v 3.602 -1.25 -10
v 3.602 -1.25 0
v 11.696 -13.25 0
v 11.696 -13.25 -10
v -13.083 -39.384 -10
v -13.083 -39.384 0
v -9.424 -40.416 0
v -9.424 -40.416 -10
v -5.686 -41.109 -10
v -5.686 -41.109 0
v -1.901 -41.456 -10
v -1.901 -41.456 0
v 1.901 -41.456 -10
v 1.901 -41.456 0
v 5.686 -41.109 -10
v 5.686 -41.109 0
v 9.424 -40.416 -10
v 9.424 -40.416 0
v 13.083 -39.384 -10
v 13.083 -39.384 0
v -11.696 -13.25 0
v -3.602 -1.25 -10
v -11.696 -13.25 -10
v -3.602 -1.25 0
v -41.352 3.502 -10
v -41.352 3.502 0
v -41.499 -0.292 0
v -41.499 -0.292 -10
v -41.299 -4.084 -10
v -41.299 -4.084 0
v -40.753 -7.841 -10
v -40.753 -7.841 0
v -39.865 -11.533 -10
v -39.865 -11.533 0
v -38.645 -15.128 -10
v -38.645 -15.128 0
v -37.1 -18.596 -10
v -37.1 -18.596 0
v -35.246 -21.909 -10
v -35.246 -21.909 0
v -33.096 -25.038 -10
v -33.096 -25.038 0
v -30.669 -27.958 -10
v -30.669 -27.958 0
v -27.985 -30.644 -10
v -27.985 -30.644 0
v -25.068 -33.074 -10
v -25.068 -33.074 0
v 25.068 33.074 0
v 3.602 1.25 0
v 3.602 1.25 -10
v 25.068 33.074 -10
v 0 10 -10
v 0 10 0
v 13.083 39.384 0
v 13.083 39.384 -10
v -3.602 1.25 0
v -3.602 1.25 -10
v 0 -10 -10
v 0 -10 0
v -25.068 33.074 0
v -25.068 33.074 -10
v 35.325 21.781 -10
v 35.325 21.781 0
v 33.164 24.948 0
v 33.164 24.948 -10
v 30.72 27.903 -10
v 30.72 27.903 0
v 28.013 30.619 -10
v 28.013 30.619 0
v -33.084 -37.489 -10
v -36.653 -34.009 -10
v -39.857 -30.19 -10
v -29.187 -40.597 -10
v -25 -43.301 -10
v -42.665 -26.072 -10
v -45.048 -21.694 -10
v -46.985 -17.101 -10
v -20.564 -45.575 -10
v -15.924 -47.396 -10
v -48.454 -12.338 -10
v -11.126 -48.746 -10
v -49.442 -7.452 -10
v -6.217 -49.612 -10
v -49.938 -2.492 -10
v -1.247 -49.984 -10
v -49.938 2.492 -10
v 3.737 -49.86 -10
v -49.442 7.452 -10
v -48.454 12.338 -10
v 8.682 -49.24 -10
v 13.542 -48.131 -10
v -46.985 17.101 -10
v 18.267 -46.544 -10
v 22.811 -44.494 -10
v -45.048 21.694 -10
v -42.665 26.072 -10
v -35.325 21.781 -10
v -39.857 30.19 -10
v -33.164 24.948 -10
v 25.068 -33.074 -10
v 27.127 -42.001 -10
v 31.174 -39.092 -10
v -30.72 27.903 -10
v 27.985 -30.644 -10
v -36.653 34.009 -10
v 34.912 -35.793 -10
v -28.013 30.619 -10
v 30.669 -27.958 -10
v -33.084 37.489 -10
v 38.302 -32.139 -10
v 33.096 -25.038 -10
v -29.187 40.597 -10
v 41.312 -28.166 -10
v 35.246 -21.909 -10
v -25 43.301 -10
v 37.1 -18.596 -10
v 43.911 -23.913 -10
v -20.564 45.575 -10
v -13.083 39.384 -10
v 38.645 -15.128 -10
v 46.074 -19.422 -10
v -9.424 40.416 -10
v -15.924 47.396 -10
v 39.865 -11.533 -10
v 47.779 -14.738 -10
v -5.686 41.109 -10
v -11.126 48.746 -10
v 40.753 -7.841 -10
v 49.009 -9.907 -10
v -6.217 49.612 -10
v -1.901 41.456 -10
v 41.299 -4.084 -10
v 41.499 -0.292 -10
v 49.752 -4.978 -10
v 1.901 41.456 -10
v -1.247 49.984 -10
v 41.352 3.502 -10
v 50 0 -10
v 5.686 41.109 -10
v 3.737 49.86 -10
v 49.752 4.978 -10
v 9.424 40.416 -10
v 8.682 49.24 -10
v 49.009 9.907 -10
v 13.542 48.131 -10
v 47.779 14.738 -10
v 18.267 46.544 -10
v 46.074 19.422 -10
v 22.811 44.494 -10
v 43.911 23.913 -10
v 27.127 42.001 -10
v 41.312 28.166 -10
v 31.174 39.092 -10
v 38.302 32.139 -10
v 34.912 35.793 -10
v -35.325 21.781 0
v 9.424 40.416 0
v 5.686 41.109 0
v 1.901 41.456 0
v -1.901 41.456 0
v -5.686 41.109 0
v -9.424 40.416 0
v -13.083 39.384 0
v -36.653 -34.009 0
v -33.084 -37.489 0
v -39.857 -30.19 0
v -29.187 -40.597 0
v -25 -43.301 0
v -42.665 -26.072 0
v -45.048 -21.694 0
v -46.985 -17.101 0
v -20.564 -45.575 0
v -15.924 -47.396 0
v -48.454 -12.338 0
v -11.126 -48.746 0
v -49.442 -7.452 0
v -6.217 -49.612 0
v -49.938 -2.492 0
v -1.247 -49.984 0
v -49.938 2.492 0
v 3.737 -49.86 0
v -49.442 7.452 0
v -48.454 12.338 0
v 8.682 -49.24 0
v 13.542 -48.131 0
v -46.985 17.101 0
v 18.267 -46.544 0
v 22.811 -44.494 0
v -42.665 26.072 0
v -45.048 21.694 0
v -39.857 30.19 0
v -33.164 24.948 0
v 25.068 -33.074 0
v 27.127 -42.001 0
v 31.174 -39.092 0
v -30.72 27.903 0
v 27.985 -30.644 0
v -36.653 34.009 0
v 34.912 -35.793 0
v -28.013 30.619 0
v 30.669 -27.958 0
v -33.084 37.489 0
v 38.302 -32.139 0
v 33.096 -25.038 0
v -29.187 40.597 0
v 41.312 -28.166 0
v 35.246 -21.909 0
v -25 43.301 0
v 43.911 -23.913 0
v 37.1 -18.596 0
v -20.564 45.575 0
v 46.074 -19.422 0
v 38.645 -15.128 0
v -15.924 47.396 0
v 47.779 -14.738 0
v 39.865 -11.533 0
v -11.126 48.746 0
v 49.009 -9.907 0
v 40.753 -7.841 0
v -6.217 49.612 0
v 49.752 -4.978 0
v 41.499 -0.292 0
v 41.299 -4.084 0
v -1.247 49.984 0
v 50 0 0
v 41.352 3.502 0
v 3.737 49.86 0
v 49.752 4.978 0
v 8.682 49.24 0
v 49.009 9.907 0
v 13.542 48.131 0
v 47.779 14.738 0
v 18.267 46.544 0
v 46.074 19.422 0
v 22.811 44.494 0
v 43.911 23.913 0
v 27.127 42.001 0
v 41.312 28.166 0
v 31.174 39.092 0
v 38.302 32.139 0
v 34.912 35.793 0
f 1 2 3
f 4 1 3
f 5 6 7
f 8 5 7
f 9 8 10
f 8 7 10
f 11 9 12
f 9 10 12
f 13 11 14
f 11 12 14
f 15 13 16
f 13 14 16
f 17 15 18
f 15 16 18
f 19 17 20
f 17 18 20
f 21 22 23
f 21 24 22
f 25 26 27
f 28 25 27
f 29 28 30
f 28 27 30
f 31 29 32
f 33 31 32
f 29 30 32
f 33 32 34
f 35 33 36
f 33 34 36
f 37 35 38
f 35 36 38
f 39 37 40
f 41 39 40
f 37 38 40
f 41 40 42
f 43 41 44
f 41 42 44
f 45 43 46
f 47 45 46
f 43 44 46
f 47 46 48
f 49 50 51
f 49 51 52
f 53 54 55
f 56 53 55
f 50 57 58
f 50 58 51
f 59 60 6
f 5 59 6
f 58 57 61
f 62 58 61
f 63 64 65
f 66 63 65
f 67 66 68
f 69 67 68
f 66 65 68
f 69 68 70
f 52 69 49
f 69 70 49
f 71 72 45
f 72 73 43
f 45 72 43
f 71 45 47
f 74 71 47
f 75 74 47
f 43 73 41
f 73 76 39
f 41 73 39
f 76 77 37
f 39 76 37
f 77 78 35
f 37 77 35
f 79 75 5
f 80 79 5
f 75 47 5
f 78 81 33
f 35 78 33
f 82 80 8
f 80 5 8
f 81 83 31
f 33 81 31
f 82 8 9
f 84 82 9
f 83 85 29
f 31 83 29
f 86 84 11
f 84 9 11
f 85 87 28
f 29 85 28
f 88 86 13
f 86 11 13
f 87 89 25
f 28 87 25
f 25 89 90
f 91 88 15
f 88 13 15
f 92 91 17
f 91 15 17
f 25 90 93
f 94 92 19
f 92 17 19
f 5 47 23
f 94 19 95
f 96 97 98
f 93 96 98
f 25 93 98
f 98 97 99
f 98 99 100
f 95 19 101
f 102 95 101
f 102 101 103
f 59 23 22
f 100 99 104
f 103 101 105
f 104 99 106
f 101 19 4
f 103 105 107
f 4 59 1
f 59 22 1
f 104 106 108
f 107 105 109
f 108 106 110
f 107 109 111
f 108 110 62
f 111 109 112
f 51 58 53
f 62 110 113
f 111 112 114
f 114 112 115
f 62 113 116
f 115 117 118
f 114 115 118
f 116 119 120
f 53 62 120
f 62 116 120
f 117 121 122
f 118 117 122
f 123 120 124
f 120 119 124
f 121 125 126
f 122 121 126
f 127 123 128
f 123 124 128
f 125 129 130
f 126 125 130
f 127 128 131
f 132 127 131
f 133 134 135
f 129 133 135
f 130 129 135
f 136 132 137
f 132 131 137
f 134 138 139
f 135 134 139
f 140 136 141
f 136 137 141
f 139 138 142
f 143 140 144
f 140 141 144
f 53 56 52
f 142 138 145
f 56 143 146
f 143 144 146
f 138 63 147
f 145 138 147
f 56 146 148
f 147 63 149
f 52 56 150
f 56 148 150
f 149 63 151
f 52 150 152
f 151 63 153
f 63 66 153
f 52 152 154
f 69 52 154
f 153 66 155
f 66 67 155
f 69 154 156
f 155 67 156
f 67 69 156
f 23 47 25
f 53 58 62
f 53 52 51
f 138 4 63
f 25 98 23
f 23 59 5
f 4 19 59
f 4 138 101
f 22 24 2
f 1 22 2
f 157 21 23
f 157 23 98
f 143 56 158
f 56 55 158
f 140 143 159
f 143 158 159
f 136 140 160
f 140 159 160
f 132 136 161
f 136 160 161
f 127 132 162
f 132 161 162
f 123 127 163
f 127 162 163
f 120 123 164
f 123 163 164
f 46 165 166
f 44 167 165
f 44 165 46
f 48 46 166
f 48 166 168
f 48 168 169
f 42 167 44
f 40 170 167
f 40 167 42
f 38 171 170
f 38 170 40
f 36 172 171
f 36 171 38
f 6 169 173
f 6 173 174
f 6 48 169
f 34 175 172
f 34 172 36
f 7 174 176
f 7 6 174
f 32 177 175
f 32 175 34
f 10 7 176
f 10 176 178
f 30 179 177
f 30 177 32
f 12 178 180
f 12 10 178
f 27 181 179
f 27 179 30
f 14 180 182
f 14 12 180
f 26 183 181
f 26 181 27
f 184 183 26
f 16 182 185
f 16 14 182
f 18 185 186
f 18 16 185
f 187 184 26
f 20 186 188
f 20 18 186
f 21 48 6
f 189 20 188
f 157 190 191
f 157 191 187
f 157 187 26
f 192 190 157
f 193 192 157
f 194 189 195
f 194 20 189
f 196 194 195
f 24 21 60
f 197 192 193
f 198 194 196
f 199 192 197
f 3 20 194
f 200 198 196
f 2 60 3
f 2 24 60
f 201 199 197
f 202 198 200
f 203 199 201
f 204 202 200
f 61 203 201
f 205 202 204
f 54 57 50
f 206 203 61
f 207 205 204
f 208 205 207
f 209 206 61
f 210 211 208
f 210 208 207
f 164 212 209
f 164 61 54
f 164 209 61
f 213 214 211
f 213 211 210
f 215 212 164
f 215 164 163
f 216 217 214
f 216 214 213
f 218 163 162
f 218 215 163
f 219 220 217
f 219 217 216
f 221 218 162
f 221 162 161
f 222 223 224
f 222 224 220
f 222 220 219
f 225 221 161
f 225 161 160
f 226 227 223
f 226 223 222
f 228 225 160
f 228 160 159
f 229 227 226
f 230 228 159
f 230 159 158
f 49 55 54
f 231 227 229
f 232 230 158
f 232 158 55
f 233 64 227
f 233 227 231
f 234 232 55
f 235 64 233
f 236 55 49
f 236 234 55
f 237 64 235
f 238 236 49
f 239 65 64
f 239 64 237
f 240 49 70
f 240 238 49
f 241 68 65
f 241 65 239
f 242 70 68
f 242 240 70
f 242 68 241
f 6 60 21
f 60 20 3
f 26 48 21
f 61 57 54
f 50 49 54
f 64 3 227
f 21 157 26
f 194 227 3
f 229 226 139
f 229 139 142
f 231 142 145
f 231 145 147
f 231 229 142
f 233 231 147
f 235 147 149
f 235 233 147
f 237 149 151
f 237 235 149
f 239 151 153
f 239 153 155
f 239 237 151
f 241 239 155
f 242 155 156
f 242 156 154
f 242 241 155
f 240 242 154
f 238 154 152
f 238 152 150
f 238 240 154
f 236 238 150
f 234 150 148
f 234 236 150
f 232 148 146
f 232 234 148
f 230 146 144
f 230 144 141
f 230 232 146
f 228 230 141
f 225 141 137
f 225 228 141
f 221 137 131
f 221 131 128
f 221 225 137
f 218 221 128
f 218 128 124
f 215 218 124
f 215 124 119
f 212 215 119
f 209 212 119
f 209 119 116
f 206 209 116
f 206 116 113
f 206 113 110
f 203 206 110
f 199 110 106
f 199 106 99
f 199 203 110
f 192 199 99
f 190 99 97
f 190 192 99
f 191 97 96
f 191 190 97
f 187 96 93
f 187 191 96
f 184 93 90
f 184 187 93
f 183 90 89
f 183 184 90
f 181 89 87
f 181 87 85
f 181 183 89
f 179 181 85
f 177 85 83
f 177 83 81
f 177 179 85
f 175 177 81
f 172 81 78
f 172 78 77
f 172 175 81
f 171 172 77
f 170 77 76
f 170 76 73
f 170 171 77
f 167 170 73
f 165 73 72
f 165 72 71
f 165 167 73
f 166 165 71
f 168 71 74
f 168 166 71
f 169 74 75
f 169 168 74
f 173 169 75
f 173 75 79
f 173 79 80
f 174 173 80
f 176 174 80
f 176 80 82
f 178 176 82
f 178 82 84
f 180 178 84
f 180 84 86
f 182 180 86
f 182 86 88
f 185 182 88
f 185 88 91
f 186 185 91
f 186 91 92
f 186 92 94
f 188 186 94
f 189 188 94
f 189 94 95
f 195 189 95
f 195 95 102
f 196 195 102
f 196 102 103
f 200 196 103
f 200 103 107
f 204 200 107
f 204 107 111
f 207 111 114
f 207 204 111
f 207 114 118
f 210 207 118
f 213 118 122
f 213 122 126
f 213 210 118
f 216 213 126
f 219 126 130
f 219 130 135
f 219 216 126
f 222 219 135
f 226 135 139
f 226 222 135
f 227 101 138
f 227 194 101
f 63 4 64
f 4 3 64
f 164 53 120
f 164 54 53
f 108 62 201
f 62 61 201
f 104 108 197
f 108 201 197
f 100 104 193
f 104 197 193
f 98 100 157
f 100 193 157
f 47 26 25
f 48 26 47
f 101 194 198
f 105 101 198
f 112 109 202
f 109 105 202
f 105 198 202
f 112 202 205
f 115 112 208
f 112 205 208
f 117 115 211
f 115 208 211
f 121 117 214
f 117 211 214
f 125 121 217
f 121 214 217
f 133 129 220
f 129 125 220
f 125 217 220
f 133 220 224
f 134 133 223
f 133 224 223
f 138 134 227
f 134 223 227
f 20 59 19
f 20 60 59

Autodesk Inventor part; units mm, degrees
ref_plane "XZ Plane" through (0, 0, 0) normal (0, 1, 0) x (-1, 0, 0)
ref_plane "XY Plane" through (0, 0, 0) normal (0, 0, 1) x (1, 0, 0)
sketch "Skizze2" plane through (0, 0, 0) normal (0, 0, 1) x (1, 0, 0)
  circle A0 centre (0, 0) radius 50
  circle A1 centre (0, 0) radius 41.5 construction
  dimension "d12" = 100
  dimension "d13" = 83
extrude "Extrusion3" add sketch "Skizze2" against normal blind 10
sketch "Skizze3" plane through (0, 0, 0) normal (0, 0, 1) x (1, 0, 0)
  circle A0 centre (0, 0) radius 50 projected
  line L0 (0, 50) -> (0, -50) construction
  line L1 (-50, 0) -> (50, 0) construction
  line L2 (0, -10) -> (-13.0826, -39.384)
  line L3 (0, -10) -> (13.0826, -39.384)
  circle A1 centre (0, 0) radius 41.5 construction
  arc A2 (-13.0826, -39.384) -> (13.0826, -39.384) centre (0, 0) ccw
  dimension "d16" = 48
  dimension "d17" = 10
extrude "Extrusion4" cut sketch "Skizze3" against normal up to surface (10 mm away) contours L3 A2 L2
pattern_circular "Runde Anordnung1" count 2 over 360 about axis through (0, 0, 0) along (0, 0, -1) of "Extrusion4"
sketch "Skizze4" plane through (0, 0, 0) normal (0, 0, 1) x (1, 0, 0)
  line L0 (-50, 0) -> (50, 0) construction
  line L1 (0, 50) -> (0, -50) construction
  line L2 (-3.6024, 1.25) -> (3.6024, 1.25)
  line L3 (-3.6024, -1.25) -> (3.6024, -1.25)
  line L4 (3.6024, 1.25) -> (25.0677, 33.0736)
  circle A0 centre (0, 0) radius 41.5 construction
  line L5 (13.0826, 39.384) -> (0, 10) projected
  line L6 (3.6024, -1.25) -> (11.6965, -13.25)
  line L7 (11.6965, -13.25) -> (35.325, 21.7807)
  line L8 (0, -10) -> (13.0826, -39.384) projected
  arc A1 (35.325, 21.7807) -> (25.0677, 33.0736) centre (0, 0) ccw
  line L9 (-3.6024, 1.25) -> (-25.0677, 33.0736)
  line L10 (0, 10) -> (-13.0826, 39.384) projected
  line L11 (-3.6024, -1.25) -> (-11.6965, -13.25)
  line L12 (-11.6965, -13.25) -> (-35.325, 21.7807)
  arc A2 (-25.0677, 33.0736) -> (-35.325, 21.7807) centre (0, 0) ccw
  line L13 (-13.0826, -39.384) -> (0, -10) projected
  dimension "d23" = 2.5
  dimension "d30" = 12
  dimension "d31" = 10
  dimension "d32" = 10
  dimension "d33" = 10
  dimension "d34" = 10
extrude "Extrusion5" cut sketch "Skizze4" against normal up to surface (10 mm away)
sketch "Skizze5" plane through (0, 0, 0) normal (0, 0, 1) x (1, 0, 0)
  circle A0 centre (0, 0) radius 41.5 construction
  line L0 (0, 50) -> (0, -50) construction
  line L1 (-50, 0) -> (50, 0) construction
  line L2 (-11.6965, -13.25) -> (-35.325, 21.7807) projected
  line L3 (-41.352, 3.5016) -> (-25.0677, -33.0736)
  line L4 (-13.4789, -15.8926) -> (-28.8614, -38.698) construction
  line L5 (-3.6024, -1.25) -> (-11.6965, -13.25) projected
  arc A1 (-41.352, 3.5016) -> (-25.0677, -33.0736) centre (0, 0) ccw
  point P0 (-33.2098, -14.786)
  dimension "d41" = 10
extrude "Extrusion6" cut sketch "Skizze5" against normal up to surface (10 mm away)
ref_plane "Arbeitsebene1" through (0, 0, 0) normal (1, 0, 0) x (0, 1, 0)
mirror "Spiegeln1" about plane through (0, 0, 0) normal (1, 0, 0) of "Extrusion6"
equation "\"d32\" = d31"
properties part number "VW" material "Stahl, galvanisiert"
